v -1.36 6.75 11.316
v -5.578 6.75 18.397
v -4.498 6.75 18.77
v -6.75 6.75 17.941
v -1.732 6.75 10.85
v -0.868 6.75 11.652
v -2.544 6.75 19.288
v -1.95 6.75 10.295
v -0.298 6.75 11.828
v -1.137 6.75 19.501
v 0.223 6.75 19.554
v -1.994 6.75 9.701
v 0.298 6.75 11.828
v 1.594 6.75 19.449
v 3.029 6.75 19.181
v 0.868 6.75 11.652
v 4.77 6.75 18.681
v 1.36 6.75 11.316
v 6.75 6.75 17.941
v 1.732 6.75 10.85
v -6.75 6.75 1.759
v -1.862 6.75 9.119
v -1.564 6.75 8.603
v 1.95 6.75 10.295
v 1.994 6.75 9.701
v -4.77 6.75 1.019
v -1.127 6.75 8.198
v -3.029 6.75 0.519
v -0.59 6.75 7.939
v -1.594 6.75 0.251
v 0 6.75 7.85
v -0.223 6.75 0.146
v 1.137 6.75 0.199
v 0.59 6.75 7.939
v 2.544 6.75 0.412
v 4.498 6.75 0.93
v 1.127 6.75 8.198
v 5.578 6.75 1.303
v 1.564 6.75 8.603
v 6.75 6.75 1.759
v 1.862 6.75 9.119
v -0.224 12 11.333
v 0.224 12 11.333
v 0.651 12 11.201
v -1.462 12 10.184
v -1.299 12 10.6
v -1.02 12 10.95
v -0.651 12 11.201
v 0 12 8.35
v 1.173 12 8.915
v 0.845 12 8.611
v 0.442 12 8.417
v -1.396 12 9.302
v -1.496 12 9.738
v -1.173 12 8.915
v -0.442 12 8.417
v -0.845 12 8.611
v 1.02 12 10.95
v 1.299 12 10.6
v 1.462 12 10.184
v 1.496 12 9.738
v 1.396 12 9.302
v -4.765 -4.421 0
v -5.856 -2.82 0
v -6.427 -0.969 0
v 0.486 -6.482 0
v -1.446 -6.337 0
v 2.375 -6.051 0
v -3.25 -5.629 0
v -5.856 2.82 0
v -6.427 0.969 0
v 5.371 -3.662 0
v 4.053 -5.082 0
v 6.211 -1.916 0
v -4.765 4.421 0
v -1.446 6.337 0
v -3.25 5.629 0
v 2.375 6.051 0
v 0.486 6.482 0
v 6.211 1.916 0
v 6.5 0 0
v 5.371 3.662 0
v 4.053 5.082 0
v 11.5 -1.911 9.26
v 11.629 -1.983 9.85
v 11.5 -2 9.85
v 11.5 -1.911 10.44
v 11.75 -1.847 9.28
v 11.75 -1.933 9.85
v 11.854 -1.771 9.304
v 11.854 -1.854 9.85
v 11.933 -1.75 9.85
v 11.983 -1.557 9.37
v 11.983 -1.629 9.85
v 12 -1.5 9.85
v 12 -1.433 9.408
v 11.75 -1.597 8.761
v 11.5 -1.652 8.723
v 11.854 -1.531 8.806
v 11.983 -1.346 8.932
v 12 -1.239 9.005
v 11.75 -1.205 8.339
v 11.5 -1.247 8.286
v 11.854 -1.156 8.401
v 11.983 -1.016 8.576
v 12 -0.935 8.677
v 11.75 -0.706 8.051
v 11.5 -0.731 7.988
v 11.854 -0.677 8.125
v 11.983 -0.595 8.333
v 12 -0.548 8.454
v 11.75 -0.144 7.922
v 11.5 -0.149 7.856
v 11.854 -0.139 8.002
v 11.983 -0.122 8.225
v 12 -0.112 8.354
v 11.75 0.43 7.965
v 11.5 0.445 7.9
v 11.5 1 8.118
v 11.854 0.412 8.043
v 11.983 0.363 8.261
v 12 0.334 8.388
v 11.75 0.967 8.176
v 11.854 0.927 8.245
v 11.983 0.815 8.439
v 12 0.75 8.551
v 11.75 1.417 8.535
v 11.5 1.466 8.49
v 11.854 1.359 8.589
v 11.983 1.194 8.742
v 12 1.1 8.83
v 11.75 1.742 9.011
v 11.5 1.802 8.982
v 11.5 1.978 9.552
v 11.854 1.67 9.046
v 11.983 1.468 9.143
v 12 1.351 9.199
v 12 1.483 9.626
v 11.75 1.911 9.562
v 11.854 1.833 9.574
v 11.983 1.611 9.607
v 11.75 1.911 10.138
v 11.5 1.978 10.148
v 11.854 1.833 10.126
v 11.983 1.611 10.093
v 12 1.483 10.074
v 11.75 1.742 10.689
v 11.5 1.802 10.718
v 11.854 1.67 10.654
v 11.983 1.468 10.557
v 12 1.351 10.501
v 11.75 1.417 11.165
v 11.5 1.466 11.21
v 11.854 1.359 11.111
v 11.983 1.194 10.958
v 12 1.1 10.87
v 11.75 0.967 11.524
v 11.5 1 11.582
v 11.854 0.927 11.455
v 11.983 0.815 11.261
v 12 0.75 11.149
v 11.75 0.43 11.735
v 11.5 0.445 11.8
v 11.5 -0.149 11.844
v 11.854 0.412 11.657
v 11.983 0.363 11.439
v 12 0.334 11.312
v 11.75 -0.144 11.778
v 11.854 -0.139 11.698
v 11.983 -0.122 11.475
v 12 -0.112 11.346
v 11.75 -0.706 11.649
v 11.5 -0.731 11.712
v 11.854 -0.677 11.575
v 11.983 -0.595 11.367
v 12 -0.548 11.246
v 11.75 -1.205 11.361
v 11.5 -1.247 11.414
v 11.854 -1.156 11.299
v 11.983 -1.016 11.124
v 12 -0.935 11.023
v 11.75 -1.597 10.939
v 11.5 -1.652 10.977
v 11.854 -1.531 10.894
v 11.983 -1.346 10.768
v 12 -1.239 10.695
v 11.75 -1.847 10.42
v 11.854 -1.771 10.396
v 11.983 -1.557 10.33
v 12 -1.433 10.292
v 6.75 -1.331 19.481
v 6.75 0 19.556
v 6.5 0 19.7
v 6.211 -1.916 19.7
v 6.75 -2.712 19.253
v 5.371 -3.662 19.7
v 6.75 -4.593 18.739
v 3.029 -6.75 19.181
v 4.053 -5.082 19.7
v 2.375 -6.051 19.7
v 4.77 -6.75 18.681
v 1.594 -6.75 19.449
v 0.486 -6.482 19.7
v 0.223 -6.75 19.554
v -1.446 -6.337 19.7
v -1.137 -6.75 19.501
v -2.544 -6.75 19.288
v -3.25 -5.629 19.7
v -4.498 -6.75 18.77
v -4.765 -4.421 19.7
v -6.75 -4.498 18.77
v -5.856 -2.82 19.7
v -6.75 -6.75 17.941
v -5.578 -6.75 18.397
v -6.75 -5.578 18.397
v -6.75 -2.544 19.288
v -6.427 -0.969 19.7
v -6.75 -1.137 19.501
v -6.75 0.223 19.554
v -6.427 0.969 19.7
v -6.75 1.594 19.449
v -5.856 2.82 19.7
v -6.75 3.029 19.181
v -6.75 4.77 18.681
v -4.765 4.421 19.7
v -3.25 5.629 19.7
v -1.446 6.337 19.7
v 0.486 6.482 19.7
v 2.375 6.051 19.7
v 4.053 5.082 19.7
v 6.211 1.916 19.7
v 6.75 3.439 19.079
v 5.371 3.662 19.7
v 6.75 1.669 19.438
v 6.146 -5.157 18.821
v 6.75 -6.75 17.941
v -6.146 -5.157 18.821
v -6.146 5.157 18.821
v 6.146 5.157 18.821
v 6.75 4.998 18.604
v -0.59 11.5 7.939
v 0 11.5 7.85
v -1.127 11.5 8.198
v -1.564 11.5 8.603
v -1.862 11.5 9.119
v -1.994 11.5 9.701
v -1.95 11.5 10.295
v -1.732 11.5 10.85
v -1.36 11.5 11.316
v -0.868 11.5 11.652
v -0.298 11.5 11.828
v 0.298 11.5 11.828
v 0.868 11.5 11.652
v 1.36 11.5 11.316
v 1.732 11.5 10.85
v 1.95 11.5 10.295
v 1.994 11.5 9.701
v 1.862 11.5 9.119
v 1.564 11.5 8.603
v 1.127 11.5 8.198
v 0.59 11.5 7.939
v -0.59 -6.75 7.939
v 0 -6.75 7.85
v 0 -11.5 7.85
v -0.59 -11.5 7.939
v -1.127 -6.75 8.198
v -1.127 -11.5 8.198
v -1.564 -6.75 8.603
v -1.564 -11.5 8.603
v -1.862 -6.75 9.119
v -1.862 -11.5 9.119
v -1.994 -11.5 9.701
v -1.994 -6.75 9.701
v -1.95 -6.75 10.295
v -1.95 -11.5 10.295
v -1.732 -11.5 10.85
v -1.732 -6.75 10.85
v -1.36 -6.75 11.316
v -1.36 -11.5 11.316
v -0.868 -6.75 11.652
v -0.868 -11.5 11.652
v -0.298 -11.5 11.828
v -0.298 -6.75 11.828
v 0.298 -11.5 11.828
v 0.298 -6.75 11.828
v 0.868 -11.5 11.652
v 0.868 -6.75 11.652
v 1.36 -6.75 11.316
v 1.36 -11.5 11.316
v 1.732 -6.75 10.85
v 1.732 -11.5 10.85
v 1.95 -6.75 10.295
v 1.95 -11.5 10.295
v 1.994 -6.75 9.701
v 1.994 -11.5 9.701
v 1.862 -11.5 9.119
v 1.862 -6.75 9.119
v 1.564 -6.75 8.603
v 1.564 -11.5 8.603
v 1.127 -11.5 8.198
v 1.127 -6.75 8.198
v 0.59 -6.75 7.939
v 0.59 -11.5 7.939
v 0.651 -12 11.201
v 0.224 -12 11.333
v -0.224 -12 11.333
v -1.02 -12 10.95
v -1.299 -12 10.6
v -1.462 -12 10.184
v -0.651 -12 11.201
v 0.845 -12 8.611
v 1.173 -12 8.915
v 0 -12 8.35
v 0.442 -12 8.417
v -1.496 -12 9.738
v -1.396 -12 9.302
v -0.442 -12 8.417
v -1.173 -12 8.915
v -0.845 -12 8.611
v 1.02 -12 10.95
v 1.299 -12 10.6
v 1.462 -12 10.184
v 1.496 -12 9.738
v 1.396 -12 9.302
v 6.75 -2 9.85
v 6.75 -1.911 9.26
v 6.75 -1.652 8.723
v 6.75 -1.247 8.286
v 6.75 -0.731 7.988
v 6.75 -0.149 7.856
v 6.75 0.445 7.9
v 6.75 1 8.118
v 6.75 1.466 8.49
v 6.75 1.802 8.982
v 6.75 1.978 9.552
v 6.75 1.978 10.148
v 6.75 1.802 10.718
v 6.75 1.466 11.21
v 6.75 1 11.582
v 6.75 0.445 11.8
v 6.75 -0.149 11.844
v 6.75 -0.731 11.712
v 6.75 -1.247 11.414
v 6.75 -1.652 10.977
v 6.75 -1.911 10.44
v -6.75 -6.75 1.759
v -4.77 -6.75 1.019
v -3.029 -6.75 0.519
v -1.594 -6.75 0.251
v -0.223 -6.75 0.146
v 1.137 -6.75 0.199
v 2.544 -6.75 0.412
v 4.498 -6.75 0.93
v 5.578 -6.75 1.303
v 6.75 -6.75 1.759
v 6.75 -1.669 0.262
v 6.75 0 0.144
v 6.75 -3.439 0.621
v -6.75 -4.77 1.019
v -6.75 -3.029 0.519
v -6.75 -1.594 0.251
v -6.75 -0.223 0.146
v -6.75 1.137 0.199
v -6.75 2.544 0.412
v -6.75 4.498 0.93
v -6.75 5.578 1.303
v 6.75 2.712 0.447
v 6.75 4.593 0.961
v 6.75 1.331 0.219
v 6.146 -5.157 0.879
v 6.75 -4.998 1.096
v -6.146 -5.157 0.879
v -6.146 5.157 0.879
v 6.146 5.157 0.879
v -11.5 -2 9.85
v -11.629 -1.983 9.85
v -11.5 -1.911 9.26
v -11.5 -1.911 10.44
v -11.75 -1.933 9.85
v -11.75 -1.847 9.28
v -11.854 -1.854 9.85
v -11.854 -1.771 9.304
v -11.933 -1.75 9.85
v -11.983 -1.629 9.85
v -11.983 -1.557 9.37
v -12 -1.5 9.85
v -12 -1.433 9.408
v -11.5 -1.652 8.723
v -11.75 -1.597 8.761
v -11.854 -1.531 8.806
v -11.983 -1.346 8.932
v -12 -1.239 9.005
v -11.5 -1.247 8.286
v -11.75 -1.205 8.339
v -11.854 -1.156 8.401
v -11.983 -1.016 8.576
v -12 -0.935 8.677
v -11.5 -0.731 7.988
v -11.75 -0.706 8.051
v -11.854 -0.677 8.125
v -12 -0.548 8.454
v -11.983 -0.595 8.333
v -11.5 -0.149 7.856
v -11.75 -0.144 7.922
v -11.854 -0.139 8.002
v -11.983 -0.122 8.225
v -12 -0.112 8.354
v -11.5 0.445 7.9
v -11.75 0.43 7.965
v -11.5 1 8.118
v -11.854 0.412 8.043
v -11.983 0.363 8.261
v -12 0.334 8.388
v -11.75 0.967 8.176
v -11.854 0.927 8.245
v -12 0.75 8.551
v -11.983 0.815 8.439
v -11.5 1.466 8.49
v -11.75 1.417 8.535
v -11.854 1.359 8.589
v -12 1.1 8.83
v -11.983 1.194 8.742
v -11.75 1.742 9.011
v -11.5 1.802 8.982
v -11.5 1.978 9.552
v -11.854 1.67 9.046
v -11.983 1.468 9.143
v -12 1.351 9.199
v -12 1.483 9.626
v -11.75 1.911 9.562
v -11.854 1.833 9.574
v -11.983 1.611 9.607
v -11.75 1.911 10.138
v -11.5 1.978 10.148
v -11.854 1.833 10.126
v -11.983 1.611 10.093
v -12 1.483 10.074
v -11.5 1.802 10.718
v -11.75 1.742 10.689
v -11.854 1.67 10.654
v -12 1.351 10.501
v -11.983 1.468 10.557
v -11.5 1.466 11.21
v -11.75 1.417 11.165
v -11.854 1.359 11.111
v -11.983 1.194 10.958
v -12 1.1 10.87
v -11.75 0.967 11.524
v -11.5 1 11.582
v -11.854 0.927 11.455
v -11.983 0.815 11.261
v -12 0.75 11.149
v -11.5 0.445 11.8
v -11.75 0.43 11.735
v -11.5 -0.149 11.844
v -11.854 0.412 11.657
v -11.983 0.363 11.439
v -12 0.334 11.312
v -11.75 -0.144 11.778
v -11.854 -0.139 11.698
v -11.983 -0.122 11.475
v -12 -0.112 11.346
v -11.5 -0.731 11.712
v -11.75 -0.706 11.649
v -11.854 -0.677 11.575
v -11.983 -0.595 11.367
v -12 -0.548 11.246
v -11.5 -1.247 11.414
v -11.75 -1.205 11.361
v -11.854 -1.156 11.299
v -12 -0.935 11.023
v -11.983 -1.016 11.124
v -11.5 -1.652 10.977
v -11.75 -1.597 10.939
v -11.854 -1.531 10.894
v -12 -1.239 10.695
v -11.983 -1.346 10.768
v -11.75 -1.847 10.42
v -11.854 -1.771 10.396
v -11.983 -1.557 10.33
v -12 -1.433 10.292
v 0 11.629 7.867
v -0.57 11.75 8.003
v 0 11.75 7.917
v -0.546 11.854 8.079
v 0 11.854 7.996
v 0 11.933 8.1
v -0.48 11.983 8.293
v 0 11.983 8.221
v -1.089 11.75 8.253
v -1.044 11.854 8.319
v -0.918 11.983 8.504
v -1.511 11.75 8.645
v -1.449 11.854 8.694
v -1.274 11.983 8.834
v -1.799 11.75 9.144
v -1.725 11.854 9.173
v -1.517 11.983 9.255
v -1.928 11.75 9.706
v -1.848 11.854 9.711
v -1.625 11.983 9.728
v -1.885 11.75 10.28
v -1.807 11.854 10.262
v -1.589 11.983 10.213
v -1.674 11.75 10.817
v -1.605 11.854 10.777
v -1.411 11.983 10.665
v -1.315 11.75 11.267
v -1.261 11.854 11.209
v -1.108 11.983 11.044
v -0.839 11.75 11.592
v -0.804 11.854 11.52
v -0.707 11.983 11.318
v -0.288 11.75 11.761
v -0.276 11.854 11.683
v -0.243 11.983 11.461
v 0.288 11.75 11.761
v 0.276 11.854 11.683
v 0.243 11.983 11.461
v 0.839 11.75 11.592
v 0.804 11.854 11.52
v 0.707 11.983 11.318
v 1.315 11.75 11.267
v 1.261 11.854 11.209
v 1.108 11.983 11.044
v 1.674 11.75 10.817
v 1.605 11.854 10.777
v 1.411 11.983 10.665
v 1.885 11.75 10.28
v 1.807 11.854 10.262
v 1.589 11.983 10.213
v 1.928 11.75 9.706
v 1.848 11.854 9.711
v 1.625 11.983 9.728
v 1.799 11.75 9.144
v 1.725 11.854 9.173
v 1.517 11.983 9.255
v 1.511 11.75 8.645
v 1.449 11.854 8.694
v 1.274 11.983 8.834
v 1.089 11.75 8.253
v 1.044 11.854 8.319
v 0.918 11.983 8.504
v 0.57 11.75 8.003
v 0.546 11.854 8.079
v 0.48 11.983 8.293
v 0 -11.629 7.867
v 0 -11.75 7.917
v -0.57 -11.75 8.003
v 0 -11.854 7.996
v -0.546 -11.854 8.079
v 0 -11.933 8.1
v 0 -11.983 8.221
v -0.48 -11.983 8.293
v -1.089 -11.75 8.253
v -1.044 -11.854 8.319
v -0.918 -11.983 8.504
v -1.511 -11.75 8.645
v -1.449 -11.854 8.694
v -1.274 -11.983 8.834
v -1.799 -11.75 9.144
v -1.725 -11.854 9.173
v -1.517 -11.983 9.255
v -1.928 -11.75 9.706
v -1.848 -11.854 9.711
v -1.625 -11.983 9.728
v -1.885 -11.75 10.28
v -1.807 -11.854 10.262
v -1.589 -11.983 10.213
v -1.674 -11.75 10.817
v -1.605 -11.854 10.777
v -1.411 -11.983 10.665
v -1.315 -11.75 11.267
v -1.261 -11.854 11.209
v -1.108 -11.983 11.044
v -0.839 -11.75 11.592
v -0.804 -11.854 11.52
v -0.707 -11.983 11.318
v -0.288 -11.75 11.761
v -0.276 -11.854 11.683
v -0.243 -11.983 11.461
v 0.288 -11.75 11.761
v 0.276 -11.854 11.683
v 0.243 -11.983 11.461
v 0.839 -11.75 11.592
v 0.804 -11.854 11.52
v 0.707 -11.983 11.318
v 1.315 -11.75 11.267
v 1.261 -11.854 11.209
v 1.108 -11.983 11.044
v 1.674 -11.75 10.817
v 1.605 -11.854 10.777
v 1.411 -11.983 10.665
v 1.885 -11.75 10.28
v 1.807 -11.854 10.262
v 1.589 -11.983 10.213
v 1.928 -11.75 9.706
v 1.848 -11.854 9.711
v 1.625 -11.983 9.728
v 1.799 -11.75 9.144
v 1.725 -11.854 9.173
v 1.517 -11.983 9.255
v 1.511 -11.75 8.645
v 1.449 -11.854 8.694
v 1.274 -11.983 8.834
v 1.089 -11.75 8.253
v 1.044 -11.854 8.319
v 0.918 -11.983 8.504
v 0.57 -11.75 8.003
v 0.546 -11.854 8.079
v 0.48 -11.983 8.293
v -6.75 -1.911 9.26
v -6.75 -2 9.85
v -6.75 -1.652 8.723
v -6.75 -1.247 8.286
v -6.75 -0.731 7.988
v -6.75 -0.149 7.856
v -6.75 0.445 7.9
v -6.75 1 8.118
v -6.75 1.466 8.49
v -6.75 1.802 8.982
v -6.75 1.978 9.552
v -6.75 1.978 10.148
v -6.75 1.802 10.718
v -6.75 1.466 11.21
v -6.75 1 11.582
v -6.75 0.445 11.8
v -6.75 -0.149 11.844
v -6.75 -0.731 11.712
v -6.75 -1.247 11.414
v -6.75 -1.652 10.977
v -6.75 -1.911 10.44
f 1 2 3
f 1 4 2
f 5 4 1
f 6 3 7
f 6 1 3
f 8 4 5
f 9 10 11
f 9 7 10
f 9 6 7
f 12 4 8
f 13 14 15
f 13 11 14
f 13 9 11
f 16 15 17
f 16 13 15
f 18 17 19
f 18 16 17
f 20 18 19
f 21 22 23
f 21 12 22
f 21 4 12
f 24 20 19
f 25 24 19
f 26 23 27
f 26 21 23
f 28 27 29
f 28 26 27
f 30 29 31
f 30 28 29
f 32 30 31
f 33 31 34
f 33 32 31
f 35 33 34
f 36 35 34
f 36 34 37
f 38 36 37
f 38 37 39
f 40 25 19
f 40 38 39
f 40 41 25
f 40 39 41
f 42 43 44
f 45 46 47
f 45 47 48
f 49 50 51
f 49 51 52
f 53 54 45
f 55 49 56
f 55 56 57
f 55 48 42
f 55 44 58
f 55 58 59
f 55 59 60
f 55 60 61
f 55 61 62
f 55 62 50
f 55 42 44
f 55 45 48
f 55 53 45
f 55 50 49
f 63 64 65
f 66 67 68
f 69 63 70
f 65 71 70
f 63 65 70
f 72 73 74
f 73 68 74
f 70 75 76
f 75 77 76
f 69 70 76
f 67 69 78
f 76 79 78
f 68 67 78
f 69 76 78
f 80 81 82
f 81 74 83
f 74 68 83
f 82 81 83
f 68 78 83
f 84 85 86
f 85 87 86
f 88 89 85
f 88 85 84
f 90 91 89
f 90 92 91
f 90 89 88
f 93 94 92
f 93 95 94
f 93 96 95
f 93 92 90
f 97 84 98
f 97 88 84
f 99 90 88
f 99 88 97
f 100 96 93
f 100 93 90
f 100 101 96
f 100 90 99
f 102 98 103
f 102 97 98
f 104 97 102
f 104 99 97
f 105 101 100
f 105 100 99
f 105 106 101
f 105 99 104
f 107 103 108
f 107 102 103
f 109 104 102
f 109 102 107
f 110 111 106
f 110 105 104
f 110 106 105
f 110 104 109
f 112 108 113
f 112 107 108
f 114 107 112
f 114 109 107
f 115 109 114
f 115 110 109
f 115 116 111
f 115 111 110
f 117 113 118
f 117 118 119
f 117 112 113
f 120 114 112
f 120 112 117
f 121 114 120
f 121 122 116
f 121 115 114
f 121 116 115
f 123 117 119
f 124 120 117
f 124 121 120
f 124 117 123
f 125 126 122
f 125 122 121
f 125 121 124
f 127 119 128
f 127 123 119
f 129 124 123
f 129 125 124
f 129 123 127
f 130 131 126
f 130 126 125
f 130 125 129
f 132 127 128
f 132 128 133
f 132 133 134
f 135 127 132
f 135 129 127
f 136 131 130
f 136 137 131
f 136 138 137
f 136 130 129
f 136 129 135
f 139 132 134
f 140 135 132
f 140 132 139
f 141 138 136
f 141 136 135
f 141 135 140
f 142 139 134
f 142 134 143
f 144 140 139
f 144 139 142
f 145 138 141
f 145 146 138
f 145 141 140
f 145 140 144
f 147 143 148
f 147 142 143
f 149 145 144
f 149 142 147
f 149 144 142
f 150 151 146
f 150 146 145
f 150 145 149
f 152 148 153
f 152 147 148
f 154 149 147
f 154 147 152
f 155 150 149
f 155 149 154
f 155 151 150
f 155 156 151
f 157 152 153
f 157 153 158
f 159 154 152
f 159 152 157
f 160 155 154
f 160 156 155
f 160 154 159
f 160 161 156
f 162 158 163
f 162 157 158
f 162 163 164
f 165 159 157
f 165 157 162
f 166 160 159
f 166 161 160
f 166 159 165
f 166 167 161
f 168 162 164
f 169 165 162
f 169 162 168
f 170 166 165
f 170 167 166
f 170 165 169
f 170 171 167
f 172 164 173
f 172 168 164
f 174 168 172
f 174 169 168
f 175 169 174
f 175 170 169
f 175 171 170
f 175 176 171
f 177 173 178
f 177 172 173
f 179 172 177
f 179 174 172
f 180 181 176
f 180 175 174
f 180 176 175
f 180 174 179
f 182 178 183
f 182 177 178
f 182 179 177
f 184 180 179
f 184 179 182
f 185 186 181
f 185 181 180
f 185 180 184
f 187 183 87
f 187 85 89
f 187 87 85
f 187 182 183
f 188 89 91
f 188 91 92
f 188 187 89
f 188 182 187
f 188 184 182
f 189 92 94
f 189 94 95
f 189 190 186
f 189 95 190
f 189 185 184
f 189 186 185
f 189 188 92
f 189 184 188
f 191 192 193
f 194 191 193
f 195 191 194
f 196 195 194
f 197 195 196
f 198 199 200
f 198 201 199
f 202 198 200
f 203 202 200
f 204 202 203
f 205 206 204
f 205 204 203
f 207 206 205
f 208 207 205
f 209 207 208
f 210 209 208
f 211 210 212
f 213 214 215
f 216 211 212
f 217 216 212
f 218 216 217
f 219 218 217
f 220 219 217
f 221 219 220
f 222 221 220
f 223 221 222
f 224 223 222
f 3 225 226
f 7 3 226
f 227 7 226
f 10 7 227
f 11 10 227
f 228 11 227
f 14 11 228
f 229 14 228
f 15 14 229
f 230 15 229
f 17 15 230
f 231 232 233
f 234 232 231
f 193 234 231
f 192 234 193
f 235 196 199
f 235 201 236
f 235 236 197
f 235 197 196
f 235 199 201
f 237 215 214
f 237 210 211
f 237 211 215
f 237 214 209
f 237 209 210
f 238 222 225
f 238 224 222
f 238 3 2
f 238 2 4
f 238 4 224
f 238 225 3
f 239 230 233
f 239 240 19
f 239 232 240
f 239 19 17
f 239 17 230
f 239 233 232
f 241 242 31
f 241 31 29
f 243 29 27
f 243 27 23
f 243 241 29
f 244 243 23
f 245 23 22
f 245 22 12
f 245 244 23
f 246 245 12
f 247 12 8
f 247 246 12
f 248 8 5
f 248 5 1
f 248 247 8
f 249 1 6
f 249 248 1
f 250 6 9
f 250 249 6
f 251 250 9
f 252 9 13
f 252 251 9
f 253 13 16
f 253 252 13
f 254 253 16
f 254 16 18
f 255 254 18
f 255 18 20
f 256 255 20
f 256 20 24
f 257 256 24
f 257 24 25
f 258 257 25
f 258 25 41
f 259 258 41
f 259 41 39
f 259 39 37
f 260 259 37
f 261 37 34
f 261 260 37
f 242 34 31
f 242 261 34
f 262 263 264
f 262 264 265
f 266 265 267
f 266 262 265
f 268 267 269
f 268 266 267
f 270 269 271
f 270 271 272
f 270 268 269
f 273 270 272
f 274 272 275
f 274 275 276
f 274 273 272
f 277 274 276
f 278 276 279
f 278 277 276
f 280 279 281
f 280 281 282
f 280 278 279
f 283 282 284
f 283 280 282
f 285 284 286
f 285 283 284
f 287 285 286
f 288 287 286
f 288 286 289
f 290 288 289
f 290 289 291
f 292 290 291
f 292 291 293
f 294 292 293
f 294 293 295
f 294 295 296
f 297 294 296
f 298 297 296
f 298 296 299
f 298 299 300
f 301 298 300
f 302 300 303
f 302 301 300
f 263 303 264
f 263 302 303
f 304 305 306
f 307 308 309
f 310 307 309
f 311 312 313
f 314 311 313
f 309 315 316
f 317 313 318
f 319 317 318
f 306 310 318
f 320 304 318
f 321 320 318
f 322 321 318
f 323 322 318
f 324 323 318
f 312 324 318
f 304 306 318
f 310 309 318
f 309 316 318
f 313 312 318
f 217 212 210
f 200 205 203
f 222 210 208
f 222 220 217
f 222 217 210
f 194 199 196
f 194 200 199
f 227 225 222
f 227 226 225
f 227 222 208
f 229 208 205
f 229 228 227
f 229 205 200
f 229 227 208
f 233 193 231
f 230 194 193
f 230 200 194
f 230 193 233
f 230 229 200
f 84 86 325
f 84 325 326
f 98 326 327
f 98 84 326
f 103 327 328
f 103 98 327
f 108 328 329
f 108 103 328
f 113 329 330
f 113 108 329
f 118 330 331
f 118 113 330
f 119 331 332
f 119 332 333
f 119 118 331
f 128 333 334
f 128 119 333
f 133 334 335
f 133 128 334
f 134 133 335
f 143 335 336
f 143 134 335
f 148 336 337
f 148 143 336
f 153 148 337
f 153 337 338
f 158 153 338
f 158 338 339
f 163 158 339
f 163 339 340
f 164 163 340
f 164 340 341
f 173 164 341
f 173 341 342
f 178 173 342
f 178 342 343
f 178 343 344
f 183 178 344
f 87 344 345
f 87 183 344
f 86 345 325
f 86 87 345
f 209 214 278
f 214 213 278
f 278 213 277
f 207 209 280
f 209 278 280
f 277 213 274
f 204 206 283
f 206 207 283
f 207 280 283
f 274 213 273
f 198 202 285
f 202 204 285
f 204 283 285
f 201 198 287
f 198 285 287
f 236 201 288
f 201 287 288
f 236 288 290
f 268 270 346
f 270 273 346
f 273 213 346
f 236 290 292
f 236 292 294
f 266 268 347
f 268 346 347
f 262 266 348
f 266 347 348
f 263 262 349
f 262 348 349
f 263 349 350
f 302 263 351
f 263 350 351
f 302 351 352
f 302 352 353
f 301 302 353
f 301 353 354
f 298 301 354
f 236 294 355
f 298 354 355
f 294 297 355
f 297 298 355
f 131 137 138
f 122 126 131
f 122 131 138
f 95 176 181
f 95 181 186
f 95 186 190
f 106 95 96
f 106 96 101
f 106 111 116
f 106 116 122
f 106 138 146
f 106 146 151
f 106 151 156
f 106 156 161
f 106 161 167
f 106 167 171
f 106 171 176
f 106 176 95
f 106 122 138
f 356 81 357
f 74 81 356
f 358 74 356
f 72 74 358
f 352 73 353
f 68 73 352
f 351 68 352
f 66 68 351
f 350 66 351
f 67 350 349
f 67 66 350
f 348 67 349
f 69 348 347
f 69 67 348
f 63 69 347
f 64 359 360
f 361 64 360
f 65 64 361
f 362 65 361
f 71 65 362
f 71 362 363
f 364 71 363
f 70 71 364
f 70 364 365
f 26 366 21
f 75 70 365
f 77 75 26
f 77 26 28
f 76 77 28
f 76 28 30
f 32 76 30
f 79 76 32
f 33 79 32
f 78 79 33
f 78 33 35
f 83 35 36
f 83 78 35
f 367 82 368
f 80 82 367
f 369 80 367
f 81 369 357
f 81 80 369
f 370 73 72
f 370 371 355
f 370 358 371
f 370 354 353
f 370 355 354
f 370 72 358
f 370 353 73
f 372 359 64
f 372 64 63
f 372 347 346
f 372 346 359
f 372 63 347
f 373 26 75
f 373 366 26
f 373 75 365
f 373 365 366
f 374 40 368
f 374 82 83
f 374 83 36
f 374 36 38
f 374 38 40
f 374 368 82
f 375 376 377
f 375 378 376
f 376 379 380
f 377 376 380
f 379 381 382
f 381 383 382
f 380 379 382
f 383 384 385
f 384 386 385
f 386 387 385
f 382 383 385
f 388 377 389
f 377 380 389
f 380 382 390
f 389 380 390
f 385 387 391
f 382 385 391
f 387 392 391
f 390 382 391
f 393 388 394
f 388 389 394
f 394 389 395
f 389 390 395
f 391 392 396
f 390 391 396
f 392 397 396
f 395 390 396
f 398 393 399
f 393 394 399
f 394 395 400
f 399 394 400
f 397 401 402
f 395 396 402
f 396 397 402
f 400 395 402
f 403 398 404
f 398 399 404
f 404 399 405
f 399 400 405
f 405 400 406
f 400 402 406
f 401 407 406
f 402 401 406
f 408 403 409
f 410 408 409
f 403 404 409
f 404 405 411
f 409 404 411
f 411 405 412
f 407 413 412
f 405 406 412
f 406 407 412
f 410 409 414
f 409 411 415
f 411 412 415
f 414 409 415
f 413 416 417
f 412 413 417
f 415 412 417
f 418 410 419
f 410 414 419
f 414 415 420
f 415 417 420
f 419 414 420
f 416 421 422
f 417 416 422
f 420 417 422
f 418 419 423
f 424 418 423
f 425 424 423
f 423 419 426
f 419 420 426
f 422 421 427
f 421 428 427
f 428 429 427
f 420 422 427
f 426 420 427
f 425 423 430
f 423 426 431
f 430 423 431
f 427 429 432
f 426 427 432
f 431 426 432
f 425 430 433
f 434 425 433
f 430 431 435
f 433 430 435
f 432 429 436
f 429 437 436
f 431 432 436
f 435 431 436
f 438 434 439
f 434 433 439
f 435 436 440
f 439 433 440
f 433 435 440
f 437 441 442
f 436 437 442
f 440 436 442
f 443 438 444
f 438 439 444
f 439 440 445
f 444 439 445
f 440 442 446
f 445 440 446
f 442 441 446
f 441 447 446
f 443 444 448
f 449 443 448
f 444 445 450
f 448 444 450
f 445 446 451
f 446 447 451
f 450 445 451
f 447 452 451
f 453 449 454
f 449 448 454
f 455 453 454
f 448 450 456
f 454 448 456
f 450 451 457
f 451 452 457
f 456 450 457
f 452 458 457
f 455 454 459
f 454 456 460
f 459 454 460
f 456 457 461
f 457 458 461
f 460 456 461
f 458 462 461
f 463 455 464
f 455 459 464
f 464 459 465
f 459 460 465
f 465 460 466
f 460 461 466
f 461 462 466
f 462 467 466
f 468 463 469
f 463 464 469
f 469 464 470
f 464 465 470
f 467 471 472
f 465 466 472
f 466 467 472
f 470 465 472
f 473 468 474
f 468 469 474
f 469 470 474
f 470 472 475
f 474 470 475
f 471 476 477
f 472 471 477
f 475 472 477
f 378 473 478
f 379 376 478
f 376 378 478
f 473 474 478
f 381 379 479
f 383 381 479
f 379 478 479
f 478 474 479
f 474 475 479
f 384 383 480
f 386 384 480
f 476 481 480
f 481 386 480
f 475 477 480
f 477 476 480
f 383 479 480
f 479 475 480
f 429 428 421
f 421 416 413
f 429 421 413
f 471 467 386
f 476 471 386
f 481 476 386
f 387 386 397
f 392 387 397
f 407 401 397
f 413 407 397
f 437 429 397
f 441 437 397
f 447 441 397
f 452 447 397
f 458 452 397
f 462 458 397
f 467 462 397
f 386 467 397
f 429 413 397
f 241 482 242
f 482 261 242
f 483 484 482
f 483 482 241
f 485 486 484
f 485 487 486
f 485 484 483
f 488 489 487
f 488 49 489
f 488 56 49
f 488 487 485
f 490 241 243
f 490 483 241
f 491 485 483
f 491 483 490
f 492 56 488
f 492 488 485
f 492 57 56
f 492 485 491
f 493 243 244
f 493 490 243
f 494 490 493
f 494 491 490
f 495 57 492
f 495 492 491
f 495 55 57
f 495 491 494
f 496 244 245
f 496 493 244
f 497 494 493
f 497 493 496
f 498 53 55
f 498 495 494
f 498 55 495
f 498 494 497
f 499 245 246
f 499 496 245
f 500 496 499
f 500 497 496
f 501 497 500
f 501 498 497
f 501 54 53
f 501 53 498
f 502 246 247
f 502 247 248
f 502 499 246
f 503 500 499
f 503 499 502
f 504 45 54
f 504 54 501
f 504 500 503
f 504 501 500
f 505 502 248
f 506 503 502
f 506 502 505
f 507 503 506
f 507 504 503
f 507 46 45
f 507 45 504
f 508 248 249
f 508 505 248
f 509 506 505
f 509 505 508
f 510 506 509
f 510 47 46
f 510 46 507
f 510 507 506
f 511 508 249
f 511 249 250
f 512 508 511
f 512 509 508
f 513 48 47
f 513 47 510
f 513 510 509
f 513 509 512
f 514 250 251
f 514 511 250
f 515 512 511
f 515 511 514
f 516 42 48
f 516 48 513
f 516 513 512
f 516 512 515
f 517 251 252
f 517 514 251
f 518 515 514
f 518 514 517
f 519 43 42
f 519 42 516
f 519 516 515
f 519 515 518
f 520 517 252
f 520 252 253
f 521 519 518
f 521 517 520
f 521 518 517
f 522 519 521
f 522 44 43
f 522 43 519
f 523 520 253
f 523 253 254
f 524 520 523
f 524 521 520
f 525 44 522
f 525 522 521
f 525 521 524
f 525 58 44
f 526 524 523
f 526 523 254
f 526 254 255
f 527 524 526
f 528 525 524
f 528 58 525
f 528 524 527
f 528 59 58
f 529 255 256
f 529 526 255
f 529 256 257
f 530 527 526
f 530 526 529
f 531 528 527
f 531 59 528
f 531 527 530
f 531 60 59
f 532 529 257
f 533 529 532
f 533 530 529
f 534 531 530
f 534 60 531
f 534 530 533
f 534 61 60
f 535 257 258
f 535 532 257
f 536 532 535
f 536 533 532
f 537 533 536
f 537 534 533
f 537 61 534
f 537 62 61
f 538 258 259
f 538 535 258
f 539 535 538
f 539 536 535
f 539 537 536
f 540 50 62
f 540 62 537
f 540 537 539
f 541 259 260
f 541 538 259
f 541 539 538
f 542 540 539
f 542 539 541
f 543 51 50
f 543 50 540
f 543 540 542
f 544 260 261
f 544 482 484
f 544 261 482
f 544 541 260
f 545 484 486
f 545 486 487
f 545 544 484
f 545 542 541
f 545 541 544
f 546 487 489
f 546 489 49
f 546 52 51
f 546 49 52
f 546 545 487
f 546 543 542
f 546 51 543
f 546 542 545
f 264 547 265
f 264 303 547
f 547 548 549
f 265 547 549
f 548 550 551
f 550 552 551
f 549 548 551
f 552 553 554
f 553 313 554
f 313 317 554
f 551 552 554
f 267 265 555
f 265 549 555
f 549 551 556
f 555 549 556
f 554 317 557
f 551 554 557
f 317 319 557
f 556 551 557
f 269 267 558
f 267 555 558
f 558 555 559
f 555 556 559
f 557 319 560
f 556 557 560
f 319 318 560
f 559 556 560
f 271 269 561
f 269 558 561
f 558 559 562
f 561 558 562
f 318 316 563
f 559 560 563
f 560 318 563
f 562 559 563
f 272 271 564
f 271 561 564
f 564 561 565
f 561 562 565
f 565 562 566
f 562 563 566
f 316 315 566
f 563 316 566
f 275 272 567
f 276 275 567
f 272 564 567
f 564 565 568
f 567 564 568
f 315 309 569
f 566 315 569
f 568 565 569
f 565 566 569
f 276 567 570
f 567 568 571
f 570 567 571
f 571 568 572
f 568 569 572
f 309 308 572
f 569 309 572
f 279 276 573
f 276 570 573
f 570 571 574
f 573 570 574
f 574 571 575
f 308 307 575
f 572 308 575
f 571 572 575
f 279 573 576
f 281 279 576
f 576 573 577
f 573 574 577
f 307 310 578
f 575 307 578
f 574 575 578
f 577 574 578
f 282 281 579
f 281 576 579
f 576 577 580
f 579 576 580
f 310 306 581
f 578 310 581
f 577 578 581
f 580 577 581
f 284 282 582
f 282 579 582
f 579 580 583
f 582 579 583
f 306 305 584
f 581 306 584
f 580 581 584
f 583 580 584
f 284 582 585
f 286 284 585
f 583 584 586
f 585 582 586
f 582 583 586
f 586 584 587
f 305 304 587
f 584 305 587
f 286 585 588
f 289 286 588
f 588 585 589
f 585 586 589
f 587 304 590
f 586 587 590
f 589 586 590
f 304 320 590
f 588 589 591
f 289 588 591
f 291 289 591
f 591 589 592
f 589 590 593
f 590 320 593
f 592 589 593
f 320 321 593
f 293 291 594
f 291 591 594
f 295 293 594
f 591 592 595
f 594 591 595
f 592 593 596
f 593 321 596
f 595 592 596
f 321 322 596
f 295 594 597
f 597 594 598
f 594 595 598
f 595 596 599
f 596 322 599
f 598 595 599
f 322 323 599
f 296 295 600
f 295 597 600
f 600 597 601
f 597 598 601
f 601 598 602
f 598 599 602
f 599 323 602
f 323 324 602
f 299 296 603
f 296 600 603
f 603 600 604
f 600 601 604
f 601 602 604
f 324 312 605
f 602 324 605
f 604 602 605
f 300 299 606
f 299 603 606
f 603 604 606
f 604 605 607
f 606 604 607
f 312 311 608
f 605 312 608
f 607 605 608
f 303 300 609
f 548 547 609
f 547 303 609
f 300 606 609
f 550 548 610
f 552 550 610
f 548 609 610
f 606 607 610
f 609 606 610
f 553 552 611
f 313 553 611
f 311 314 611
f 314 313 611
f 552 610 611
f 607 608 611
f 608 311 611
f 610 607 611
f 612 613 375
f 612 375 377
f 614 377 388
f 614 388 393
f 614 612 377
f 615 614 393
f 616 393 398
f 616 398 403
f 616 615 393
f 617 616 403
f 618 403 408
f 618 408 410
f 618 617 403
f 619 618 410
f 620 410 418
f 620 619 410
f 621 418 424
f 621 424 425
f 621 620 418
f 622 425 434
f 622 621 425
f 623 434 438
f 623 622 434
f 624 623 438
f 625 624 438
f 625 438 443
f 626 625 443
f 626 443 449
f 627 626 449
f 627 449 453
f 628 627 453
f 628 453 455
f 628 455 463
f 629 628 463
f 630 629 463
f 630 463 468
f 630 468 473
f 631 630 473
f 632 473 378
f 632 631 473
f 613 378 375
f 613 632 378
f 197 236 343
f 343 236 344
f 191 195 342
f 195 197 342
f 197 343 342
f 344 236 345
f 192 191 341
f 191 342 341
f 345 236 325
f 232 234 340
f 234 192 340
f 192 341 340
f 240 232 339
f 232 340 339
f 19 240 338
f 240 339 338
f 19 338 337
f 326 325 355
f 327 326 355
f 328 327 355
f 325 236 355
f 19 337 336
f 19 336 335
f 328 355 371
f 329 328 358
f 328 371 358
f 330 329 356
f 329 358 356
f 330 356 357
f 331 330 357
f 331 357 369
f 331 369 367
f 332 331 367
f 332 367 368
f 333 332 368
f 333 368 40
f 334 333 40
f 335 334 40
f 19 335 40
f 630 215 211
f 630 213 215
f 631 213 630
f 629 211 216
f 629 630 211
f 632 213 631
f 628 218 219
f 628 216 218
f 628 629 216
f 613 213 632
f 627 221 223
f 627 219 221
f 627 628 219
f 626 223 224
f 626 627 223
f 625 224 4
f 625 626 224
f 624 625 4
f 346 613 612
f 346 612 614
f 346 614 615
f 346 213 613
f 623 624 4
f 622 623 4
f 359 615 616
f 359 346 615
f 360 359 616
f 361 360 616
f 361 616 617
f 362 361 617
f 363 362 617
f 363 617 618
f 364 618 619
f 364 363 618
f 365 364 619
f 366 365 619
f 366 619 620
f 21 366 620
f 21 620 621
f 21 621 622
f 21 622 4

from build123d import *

# Parameters (mm, degrees)
SKETCH1_W           = 13.5
SKETCH1_H           = 13.5
BOSS_EXTRUDE1_DEPTH = 19.7
SKETCH3_R           = 2
BOSS_EXTRUDE2_DEPTH = 12
SKETCH4_R           = 2
BOSS_EXTRUDE3_DEPTH = 12
FILLET1_R           = 0.5


with BuildPart() as part:
    # Sketch1 → Boss-Extrude1 (new body)
    with BuildSketch(Plane.XY):
        Rectangle(SKETCH1_W, SKETCH1_H)
    extrude(amount=BOSS_EXTRUDE1_DEPTH)

    # Sketch2 → Cut-Revolve1 (revolve, cut)
    with BuildSketch(Plane(origin=(0, 0, 0), x_dir=(1, 0, 0), z_dir=(0, 1, 0)), mode=Mode.PRIVATE) as cut_revolve1_sk:
        Polygon((-6.5, 0), (-15.39, 0), (-15.39, -19.7), (-6.5, -19.7), (-12.85, -16.033825791), (-12.85, -3.666174209), align=None)
    revolve(cut_revolve1_sk.sketch.rotate(Axis((0, 0, 20.715268644), (0, 0, -1)), 180), axis=Axis((0, 0, 20.715268644), (0, 0, -1)), mode=Mode.SUBTRACT)

    # Sketch3 → Boss-Extrude2 (add, symmetric)
    with BuildSketch(Plane(origin=(0, 0, 0), x_dir=(1, 0, 0), z_dir=(0, 1, 0))):
        with Locations(Location((0, -9.85, 0), (0, 0, 90))):
            Circle(SKETCH3_R)
    extrude(amount=BOSS_EXTRUDE2_DEPTH, both=True)

    # Sketch4 → Boss-Extrude3 (add, symmetric)
    with BuildSketch(Plane(origin=(0, 0, 0), x_dir=(0, 0, -1), z_dir=(1, 0, 0))):
        with Locations(Location((-9.85, 0, 0), (0, 0, 270))):
            Circle(SKETCH4_R)
    extrude(amount=BOSS_EXTRUDE3_DEPTH, both=True)

    # Fillet1
    fillet1_edges = [part.edges().sort_by_distance(p)[0] for p in [
        (0, -12, 11.85),
        (0, 12, 11.85),
        (-12, 2, 9.85),
        (12, 2, 9.85),
    ]]
    fillet(fillet1_edges, radius=FILLET1_R)


solid = part.part
